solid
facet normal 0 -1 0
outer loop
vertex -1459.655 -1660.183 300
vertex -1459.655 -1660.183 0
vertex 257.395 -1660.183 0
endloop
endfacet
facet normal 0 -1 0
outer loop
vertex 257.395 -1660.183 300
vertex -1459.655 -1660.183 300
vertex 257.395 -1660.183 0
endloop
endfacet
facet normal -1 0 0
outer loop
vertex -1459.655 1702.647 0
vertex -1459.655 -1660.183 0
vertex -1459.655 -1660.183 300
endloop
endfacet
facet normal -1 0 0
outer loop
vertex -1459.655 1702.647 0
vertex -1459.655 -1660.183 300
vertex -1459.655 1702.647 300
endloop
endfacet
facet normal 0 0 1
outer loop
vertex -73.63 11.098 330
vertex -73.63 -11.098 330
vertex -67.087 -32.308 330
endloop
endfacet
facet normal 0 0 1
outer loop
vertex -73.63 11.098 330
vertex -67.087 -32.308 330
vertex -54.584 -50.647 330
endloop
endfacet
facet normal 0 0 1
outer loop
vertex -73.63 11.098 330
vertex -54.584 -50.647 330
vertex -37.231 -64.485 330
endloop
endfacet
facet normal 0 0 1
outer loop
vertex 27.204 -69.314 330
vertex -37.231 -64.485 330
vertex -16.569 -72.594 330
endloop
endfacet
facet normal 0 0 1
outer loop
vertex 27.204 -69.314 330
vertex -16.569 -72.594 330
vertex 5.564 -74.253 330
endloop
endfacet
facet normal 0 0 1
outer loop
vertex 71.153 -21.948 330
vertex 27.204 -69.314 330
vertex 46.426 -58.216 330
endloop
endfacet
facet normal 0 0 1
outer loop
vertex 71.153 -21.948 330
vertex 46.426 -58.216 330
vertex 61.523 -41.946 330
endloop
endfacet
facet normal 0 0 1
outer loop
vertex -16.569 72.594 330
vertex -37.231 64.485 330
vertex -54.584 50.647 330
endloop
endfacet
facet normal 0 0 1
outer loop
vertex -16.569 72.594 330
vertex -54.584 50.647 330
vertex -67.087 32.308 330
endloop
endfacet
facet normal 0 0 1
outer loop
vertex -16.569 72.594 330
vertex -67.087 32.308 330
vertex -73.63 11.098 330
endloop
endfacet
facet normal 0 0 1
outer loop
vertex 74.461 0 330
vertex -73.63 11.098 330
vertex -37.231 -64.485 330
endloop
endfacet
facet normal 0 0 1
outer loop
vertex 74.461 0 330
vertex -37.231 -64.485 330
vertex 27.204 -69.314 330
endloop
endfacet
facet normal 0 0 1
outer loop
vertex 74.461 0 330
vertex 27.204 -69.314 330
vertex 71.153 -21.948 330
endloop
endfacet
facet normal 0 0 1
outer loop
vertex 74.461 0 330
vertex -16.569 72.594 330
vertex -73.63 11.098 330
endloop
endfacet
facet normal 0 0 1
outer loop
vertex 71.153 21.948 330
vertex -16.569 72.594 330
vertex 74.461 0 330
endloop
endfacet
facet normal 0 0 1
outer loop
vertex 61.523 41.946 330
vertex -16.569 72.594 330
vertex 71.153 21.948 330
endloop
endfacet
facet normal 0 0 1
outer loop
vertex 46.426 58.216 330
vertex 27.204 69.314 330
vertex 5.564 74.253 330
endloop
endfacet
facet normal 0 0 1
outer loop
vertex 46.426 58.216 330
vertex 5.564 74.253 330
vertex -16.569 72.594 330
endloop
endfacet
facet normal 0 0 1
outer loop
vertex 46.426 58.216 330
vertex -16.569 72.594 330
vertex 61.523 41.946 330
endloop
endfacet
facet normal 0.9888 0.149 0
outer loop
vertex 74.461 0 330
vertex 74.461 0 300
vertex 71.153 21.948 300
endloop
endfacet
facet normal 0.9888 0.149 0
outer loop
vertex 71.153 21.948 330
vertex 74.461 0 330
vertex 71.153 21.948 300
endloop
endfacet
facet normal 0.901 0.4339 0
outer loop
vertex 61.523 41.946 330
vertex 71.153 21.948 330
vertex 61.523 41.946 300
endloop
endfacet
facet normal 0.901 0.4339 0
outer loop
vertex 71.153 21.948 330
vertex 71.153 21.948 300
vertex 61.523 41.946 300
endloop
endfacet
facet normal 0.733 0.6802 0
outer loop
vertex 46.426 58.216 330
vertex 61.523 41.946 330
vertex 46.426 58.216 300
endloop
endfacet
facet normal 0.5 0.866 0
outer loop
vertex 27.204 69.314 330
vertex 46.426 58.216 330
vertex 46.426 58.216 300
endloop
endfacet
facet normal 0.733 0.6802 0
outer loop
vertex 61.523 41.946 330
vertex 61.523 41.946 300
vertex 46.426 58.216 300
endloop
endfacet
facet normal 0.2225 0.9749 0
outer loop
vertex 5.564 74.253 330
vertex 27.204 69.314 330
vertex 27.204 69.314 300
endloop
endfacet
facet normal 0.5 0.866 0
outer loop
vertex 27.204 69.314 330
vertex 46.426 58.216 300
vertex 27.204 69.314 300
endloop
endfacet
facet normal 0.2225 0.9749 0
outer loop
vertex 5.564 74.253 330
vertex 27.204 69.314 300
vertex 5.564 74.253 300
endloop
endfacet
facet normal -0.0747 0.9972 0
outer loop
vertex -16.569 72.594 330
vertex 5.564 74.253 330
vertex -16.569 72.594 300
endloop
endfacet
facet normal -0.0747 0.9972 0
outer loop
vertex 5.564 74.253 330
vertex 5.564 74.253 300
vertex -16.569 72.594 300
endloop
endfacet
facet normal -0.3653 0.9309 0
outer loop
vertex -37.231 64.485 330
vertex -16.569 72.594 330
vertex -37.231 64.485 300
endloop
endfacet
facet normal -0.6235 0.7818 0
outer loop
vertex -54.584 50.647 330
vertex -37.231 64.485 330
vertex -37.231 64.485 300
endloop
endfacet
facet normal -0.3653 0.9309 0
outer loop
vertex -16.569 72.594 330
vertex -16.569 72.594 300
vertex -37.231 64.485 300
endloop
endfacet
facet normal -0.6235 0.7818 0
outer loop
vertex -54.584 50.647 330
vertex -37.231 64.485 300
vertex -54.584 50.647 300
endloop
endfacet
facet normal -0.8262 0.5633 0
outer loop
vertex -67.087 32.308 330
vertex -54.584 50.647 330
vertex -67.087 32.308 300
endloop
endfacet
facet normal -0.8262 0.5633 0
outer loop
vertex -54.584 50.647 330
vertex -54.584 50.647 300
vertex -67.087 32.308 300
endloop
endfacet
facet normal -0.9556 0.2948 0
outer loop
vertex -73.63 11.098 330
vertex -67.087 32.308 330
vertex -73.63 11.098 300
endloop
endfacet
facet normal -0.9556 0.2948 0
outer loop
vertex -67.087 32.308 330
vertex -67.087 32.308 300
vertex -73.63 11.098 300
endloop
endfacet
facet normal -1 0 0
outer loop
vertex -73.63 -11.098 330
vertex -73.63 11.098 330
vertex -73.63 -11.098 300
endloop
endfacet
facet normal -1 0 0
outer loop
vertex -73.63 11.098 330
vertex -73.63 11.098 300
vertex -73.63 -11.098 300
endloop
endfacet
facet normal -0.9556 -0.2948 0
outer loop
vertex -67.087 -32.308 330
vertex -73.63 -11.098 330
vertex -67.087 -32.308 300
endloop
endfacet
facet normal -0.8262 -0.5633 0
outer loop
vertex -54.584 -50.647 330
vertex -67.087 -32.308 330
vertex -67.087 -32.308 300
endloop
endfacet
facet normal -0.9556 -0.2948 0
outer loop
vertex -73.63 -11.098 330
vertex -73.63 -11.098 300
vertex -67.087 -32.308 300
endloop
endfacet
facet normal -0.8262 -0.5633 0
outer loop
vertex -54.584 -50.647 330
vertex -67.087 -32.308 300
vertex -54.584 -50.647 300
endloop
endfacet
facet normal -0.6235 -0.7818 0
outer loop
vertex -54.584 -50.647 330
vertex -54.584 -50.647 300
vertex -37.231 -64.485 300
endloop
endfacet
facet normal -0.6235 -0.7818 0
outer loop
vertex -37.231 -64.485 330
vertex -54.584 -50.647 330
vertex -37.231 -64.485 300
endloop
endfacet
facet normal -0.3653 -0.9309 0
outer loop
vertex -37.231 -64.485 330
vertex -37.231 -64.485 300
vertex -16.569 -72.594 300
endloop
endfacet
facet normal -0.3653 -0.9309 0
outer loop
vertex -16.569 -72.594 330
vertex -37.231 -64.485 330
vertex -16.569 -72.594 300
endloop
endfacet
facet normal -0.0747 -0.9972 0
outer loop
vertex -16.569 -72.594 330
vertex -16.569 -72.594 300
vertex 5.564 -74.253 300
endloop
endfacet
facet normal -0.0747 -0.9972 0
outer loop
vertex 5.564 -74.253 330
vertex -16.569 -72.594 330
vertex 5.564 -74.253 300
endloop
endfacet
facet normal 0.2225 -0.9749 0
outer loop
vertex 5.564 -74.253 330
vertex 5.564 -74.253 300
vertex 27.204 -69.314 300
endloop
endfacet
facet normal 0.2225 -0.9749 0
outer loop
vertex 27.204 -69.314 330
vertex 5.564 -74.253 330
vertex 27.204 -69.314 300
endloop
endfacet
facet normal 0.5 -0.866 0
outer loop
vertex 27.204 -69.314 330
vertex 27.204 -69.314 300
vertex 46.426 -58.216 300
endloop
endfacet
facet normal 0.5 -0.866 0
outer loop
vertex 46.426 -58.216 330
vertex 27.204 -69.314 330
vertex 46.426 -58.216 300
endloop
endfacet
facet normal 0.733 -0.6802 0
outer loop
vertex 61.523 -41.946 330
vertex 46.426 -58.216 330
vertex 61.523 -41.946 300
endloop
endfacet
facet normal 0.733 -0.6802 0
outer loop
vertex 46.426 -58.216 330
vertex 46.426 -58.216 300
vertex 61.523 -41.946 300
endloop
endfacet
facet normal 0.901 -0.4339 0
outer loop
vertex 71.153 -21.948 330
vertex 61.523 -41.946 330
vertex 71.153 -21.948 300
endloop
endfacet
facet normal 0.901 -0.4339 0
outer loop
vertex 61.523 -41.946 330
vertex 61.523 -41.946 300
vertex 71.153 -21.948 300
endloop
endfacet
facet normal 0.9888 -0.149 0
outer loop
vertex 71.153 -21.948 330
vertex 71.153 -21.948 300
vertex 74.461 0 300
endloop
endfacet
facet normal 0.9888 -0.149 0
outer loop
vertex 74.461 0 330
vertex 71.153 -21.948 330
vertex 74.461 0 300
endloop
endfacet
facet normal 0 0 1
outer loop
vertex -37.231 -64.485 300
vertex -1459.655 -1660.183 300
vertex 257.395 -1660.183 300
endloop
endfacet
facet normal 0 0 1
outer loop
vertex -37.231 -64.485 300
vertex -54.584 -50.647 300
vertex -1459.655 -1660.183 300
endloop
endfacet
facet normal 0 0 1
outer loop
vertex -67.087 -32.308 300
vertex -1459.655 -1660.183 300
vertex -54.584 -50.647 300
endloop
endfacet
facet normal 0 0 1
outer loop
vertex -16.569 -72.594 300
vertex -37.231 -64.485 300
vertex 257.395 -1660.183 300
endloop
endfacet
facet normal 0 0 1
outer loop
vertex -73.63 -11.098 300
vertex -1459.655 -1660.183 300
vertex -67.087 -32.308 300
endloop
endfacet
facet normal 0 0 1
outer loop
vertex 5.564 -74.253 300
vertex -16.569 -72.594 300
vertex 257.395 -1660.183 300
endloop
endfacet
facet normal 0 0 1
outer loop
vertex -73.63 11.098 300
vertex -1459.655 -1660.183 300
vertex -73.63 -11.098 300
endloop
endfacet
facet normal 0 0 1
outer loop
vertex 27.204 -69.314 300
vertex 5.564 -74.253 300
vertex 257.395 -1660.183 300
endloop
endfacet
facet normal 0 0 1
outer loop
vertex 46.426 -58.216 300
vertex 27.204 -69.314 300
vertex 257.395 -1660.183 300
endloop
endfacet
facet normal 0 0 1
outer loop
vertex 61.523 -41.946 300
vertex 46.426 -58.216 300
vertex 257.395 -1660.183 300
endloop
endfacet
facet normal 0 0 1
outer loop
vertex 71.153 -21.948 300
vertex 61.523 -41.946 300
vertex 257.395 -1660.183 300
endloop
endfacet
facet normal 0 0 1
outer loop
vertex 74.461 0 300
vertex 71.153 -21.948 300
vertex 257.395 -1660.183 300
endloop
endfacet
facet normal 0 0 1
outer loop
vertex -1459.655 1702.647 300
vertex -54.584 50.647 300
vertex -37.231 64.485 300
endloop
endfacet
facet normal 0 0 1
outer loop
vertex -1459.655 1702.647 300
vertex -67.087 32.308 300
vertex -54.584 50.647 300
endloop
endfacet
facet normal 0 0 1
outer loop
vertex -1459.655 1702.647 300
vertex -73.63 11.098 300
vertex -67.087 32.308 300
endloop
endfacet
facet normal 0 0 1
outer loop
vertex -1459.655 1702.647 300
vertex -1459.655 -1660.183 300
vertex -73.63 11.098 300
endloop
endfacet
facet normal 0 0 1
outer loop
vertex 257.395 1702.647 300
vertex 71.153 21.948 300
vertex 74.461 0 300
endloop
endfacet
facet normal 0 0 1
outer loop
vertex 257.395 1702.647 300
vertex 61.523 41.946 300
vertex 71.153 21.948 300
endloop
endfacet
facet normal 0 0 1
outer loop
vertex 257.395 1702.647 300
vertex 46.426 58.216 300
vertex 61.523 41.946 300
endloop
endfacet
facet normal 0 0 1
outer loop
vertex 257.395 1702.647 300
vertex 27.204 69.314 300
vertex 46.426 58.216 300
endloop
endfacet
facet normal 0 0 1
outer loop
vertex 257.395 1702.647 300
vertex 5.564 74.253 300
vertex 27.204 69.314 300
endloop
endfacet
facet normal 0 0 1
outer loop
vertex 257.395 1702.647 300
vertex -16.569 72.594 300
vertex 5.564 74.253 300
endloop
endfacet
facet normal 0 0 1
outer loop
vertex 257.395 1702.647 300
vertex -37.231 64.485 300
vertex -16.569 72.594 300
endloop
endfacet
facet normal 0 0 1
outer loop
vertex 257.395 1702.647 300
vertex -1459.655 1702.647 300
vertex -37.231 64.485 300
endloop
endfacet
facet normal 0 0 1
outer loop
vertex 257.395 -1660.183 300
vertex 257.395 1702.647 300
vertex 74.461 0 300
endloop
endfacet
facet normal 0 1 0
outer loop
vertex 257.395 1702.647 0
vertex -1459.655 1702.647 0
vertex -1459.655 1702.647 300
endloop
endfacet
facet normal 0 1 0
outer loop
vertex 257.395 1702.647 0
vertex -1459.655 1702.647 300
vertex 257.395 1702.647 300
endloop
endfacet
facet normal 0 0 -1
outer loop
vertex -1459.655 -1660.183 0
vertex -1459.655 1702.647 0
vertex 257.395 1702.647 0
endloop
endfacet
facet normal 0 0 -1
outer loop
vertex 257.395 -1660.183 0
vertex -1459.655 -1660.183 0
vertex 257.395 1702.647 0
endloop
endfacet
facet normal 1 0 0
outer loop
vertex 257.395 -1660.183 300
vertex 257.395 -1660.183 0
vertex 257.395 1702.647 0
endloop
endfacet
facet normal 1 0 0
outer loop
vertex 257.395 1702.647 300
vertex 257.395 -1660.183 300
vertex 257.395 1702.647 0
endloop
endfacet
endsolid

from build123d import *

# Parameters (mm, degrees)
CROQUIS1_W              = 1717.05
CROQUIS1_H              = 3362.83
SALIENTE_EXTRUIR1_DEPTH = 300
CROQUIS2_R              = 74.461295819
SALIENTE_EXTRUIR2_DEPTH = 30


with BuildPart() as part:
    # Croquis1 → Saliente-Extruir1 (new body)
    with BuildSketch(Plane.XY):
        with Locations((-601.130390599, 21.232337461)):
            Rectangle(CROQUIS1_W, CROQUIS1_H)
    extrude(amount=SALIENTE_EXTRUIR1_DEPTH)

    # Croquis2 → Saliente-Extruir2 (add)
    with BuildSketch(Plane.XY.offset(300)):
        Circle(CROQUIS2_R)
    extrude(amount=SALIENTE_EXTRUIR2_DEPTH)


solid = part.part
